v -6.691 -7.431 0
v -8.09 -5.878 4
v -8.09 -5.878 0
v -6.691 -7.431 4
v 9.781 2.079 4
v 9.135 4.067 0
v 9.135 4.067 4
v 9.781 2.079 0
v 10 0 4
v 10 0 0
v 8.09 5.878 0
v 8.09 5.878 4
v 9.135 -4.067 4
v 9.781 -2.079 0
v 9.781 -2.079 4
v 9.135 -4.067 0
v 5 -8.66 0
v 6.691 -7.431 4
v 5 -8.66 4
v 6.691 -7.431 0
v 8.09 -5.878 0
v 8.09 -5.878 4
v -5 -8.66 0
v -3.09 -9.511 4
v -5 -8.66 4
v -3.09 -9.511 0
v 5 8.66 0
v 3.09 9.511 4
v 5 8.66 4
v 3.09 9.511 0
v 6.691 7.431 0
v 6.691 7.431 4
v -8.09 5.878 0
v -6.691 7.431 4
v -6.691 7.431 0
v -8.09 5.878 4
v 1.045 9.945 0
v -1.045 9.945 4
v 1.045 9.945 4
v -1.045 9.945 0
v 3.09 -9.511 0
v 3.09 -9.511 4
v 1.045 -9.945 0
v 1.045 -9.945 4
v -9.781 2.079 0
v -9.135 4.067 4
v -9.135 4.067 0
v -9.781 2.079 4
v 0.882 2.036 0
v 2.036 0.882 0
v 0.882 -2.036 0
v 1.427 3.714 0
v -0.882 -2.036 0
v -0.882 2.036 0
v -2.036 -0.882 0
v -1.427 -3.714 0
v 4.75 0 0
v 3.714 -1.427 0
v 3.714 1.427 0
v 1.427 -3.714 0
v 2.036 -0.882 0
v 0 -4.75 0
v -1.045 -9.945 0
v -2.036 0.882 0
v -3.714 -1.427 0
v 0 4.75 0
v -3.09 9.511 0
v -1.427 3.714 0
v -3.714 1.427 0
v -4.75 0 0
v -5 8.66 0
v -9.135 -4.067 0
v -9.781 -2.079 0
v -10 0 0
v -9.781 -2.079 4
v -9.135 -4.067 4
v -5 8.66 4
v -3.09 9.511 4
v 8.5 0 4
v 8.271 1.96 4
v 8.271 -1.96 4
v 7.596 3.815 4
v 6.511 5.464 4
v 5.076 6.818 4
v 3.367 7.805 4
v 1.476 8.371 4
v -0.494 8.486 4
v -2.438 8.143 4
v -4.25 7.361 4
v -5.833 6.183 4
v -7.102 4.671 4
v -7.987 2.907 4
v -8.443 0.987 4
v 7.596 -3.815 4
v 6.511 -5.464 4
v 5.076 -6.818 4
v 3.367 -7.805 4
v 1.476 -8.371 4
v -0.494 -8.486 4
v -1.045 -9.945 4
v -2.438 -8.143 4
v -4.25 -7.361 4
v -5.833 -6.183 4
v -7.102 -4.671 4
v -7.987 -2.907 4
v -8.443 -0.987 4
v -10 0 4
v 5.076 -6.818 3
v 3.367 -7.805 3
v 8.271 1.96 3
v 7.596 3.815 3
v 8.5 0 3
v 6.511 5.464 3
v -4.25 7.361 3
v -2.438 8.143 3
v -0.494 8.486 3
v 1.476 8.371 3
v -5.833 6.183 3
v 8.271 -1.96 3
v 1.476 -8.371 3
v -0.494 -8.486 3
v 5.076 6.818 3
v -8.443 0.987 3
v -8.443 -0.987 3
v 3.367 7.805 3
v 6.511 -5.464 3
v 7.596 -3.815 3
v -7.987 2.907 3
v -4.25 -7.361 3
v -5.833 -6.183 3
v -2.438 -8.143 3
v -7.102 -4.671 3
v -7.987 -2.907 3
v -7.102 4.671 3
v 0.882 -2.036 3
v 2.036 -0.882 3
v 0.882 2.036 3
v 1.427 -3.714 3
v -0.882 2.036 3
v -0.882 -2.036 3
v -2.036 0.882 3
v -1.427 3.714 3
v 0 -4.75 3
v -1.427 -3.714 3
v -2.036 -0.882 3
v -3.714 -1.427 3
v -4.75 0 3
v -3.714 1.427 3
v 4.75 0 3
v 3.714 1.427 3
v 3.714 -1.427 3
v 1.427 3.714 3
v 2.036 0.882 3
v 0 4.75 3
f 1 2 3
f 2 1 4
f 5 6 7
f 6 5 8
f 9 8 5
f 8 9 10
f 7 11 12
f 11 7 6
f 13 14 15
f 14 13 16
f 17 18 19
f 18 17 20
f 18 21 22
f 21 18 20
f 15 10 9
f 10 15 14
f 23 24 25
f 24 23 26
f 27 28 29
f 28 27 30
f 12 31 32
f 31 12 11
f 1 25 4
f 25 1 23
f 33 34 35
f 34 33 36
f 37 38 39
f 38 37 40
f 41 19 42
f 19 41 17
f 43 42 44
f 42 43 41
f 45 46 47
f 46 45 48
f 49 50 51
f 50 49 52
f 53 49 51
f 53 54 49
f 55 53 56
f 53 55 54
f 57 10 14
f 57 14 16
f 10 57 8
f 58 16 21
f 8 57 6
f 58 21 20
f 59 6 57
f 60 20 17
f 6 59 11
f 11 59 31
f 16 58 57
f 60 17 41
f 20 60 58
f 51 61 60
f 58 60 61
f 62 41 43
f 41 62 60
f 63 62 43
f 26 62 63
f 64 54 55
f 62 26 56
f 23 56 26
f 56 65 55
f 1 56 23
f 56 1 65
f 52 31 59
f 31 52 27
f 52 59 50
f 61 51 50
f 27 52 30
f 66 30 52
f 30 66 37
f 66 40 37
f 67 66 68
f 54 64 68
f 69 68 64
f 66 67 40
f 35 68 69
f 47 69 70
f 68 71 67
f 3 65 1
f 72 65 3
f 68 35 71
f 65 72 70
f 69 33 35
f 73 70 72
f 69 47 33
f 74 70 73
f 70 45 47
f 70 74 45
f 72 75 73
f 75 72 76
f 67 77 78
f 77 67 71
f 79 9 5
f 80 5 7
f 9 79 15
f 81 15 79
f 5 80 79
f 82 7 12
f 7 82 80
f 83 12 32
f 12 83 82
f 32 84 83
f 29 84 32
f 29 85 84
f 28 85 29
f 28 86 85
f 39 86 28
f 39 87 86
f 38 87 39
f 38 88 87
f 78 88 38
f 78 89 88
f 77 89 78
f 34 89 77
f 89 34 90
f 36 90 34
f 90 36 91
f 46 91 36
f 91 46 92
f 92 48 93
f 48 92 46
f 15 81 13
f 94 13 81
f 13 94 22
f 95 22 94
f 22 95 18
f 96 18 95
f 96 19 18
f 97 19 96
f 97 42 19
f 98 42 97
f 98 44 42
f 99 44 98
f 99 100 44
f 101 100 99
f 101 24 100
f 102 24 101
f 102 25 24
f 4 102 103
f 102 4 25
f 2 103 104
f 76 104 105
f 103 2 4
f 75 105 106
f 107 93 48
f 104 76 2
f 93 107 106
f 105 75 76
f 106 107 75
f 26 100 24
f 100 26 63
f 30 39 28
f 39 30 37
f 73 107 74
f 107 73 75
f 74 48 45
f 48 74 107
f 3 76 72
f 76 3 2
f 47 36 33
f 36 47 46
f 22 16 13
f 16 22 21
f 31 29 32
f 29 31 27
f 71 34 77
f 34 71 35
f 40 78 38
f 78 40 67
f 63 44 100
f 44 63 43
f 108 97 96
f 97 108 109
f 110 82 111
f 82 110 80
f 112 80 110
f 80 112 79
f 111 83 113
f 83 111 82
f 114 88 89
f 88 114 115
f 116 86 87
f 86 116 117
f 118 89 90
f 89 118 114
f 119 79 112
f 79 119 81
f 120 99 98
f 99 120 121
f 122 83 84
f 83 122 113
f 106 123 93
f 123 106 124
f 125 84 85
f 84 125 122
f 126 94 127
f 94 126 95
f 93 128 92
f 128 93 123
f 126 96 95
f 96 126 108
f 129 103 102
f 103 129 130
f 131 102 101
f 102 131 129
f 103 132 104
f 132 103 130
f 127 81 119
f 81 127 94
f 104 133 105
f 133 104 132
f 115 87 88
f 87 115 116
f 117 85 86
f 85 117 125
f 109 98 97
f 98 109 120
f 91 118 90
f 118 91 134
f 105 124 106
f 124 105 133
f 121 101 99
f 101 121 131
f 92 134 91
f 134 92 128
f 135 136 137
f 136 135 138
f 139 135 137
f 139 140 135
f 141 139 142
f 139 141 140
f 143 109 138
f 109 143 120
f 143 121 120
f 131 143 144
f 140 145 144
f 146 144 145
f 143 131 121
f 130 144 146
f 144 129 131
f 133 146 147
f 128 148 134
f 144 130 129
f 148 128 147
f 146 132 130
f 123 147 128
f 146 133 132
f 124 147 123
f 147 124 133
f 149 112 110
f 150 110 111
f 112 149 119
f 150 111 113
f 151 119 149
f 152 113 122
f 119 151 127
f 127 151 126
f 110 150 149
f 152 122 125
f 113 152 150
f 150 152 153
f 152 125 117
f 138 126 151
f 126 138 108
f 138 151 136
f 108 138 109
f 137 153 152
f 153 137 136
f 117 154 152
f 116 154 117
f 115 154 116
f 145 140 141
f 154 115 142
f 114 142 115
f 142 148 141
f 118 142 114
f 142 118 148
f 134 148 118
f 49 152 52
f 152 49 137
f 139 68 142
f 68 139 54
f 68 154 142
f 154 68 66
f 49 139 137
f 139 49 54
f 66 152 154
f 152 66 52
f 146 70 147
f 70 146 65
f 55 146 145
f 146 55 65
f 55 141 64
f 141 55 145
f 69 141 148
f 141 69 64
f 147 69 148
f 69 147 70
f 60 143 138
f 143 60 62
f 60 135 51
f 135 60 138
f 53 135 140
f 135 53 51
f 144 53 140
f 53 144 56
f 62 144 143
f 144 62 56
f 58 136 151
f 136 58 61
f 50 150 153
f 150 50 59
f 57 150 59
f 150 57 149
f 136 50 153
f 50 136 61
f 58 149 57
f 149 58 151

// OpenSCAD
//button with holes and a rim and a flat back for nice printing
//Customizer variables
//This section is displays the box options
//dimensions of button
//choose a style for the button.  All have flat backs for easy printing (most buttons are one sided anyway)
button_style="rim"; // [flat,bevel_edge,rim]
//total width of the button in mm
button_diameter = 20;	//	[5:100]
//thickness of the button in mm (not including decorative elements)
button_thickness = 3; // [2:50]
//number of holes
holes = 4; // [2,3,4,5,6]
//diameter of the holes in mm
holesize = 1.5; //[1:10]
//height of decorative rim (in mm) for some styles
rim_height = 1; //[1,2,3,4]

button_radius=button_diameter/2;

module buttonbody()
{
	if(button_style=="flat")
		{
		cylinder(button_thickness,button_radius,button_radius);
		}
	else if (button_style=="bevel_edge")
		{
			hull()
			{
			cylinder(0.75*button_thickness,button_radius,button_radius);
			cylinder(button_thickness,0.8*button_radius,0.8*button_radius);//inner 
			}
		}
	else if(button_style=="rim")
		{
		union()
		{
		cylinder(button_thickness,button_radius,button_radius);
		difference()
		{
		cylinder(rim_height+button_thickness,button_radius,button_radius);//outer
		cylinder(4+rim_height+button_thickness,0.85*button_radius,0.85*button_radius);//inner cut
}
}
}
}
//add holes
difference()
{
buttonbody();
	for (i=[1:holes])
		{rotate(i*360/holes,[0,0,1])
		 translate([0.5*holesize+0.25*button_radius,0,-2*button_thickness])
		cylinder (4*button_thickness + 4,holesize,holesize);
		}
}
		
